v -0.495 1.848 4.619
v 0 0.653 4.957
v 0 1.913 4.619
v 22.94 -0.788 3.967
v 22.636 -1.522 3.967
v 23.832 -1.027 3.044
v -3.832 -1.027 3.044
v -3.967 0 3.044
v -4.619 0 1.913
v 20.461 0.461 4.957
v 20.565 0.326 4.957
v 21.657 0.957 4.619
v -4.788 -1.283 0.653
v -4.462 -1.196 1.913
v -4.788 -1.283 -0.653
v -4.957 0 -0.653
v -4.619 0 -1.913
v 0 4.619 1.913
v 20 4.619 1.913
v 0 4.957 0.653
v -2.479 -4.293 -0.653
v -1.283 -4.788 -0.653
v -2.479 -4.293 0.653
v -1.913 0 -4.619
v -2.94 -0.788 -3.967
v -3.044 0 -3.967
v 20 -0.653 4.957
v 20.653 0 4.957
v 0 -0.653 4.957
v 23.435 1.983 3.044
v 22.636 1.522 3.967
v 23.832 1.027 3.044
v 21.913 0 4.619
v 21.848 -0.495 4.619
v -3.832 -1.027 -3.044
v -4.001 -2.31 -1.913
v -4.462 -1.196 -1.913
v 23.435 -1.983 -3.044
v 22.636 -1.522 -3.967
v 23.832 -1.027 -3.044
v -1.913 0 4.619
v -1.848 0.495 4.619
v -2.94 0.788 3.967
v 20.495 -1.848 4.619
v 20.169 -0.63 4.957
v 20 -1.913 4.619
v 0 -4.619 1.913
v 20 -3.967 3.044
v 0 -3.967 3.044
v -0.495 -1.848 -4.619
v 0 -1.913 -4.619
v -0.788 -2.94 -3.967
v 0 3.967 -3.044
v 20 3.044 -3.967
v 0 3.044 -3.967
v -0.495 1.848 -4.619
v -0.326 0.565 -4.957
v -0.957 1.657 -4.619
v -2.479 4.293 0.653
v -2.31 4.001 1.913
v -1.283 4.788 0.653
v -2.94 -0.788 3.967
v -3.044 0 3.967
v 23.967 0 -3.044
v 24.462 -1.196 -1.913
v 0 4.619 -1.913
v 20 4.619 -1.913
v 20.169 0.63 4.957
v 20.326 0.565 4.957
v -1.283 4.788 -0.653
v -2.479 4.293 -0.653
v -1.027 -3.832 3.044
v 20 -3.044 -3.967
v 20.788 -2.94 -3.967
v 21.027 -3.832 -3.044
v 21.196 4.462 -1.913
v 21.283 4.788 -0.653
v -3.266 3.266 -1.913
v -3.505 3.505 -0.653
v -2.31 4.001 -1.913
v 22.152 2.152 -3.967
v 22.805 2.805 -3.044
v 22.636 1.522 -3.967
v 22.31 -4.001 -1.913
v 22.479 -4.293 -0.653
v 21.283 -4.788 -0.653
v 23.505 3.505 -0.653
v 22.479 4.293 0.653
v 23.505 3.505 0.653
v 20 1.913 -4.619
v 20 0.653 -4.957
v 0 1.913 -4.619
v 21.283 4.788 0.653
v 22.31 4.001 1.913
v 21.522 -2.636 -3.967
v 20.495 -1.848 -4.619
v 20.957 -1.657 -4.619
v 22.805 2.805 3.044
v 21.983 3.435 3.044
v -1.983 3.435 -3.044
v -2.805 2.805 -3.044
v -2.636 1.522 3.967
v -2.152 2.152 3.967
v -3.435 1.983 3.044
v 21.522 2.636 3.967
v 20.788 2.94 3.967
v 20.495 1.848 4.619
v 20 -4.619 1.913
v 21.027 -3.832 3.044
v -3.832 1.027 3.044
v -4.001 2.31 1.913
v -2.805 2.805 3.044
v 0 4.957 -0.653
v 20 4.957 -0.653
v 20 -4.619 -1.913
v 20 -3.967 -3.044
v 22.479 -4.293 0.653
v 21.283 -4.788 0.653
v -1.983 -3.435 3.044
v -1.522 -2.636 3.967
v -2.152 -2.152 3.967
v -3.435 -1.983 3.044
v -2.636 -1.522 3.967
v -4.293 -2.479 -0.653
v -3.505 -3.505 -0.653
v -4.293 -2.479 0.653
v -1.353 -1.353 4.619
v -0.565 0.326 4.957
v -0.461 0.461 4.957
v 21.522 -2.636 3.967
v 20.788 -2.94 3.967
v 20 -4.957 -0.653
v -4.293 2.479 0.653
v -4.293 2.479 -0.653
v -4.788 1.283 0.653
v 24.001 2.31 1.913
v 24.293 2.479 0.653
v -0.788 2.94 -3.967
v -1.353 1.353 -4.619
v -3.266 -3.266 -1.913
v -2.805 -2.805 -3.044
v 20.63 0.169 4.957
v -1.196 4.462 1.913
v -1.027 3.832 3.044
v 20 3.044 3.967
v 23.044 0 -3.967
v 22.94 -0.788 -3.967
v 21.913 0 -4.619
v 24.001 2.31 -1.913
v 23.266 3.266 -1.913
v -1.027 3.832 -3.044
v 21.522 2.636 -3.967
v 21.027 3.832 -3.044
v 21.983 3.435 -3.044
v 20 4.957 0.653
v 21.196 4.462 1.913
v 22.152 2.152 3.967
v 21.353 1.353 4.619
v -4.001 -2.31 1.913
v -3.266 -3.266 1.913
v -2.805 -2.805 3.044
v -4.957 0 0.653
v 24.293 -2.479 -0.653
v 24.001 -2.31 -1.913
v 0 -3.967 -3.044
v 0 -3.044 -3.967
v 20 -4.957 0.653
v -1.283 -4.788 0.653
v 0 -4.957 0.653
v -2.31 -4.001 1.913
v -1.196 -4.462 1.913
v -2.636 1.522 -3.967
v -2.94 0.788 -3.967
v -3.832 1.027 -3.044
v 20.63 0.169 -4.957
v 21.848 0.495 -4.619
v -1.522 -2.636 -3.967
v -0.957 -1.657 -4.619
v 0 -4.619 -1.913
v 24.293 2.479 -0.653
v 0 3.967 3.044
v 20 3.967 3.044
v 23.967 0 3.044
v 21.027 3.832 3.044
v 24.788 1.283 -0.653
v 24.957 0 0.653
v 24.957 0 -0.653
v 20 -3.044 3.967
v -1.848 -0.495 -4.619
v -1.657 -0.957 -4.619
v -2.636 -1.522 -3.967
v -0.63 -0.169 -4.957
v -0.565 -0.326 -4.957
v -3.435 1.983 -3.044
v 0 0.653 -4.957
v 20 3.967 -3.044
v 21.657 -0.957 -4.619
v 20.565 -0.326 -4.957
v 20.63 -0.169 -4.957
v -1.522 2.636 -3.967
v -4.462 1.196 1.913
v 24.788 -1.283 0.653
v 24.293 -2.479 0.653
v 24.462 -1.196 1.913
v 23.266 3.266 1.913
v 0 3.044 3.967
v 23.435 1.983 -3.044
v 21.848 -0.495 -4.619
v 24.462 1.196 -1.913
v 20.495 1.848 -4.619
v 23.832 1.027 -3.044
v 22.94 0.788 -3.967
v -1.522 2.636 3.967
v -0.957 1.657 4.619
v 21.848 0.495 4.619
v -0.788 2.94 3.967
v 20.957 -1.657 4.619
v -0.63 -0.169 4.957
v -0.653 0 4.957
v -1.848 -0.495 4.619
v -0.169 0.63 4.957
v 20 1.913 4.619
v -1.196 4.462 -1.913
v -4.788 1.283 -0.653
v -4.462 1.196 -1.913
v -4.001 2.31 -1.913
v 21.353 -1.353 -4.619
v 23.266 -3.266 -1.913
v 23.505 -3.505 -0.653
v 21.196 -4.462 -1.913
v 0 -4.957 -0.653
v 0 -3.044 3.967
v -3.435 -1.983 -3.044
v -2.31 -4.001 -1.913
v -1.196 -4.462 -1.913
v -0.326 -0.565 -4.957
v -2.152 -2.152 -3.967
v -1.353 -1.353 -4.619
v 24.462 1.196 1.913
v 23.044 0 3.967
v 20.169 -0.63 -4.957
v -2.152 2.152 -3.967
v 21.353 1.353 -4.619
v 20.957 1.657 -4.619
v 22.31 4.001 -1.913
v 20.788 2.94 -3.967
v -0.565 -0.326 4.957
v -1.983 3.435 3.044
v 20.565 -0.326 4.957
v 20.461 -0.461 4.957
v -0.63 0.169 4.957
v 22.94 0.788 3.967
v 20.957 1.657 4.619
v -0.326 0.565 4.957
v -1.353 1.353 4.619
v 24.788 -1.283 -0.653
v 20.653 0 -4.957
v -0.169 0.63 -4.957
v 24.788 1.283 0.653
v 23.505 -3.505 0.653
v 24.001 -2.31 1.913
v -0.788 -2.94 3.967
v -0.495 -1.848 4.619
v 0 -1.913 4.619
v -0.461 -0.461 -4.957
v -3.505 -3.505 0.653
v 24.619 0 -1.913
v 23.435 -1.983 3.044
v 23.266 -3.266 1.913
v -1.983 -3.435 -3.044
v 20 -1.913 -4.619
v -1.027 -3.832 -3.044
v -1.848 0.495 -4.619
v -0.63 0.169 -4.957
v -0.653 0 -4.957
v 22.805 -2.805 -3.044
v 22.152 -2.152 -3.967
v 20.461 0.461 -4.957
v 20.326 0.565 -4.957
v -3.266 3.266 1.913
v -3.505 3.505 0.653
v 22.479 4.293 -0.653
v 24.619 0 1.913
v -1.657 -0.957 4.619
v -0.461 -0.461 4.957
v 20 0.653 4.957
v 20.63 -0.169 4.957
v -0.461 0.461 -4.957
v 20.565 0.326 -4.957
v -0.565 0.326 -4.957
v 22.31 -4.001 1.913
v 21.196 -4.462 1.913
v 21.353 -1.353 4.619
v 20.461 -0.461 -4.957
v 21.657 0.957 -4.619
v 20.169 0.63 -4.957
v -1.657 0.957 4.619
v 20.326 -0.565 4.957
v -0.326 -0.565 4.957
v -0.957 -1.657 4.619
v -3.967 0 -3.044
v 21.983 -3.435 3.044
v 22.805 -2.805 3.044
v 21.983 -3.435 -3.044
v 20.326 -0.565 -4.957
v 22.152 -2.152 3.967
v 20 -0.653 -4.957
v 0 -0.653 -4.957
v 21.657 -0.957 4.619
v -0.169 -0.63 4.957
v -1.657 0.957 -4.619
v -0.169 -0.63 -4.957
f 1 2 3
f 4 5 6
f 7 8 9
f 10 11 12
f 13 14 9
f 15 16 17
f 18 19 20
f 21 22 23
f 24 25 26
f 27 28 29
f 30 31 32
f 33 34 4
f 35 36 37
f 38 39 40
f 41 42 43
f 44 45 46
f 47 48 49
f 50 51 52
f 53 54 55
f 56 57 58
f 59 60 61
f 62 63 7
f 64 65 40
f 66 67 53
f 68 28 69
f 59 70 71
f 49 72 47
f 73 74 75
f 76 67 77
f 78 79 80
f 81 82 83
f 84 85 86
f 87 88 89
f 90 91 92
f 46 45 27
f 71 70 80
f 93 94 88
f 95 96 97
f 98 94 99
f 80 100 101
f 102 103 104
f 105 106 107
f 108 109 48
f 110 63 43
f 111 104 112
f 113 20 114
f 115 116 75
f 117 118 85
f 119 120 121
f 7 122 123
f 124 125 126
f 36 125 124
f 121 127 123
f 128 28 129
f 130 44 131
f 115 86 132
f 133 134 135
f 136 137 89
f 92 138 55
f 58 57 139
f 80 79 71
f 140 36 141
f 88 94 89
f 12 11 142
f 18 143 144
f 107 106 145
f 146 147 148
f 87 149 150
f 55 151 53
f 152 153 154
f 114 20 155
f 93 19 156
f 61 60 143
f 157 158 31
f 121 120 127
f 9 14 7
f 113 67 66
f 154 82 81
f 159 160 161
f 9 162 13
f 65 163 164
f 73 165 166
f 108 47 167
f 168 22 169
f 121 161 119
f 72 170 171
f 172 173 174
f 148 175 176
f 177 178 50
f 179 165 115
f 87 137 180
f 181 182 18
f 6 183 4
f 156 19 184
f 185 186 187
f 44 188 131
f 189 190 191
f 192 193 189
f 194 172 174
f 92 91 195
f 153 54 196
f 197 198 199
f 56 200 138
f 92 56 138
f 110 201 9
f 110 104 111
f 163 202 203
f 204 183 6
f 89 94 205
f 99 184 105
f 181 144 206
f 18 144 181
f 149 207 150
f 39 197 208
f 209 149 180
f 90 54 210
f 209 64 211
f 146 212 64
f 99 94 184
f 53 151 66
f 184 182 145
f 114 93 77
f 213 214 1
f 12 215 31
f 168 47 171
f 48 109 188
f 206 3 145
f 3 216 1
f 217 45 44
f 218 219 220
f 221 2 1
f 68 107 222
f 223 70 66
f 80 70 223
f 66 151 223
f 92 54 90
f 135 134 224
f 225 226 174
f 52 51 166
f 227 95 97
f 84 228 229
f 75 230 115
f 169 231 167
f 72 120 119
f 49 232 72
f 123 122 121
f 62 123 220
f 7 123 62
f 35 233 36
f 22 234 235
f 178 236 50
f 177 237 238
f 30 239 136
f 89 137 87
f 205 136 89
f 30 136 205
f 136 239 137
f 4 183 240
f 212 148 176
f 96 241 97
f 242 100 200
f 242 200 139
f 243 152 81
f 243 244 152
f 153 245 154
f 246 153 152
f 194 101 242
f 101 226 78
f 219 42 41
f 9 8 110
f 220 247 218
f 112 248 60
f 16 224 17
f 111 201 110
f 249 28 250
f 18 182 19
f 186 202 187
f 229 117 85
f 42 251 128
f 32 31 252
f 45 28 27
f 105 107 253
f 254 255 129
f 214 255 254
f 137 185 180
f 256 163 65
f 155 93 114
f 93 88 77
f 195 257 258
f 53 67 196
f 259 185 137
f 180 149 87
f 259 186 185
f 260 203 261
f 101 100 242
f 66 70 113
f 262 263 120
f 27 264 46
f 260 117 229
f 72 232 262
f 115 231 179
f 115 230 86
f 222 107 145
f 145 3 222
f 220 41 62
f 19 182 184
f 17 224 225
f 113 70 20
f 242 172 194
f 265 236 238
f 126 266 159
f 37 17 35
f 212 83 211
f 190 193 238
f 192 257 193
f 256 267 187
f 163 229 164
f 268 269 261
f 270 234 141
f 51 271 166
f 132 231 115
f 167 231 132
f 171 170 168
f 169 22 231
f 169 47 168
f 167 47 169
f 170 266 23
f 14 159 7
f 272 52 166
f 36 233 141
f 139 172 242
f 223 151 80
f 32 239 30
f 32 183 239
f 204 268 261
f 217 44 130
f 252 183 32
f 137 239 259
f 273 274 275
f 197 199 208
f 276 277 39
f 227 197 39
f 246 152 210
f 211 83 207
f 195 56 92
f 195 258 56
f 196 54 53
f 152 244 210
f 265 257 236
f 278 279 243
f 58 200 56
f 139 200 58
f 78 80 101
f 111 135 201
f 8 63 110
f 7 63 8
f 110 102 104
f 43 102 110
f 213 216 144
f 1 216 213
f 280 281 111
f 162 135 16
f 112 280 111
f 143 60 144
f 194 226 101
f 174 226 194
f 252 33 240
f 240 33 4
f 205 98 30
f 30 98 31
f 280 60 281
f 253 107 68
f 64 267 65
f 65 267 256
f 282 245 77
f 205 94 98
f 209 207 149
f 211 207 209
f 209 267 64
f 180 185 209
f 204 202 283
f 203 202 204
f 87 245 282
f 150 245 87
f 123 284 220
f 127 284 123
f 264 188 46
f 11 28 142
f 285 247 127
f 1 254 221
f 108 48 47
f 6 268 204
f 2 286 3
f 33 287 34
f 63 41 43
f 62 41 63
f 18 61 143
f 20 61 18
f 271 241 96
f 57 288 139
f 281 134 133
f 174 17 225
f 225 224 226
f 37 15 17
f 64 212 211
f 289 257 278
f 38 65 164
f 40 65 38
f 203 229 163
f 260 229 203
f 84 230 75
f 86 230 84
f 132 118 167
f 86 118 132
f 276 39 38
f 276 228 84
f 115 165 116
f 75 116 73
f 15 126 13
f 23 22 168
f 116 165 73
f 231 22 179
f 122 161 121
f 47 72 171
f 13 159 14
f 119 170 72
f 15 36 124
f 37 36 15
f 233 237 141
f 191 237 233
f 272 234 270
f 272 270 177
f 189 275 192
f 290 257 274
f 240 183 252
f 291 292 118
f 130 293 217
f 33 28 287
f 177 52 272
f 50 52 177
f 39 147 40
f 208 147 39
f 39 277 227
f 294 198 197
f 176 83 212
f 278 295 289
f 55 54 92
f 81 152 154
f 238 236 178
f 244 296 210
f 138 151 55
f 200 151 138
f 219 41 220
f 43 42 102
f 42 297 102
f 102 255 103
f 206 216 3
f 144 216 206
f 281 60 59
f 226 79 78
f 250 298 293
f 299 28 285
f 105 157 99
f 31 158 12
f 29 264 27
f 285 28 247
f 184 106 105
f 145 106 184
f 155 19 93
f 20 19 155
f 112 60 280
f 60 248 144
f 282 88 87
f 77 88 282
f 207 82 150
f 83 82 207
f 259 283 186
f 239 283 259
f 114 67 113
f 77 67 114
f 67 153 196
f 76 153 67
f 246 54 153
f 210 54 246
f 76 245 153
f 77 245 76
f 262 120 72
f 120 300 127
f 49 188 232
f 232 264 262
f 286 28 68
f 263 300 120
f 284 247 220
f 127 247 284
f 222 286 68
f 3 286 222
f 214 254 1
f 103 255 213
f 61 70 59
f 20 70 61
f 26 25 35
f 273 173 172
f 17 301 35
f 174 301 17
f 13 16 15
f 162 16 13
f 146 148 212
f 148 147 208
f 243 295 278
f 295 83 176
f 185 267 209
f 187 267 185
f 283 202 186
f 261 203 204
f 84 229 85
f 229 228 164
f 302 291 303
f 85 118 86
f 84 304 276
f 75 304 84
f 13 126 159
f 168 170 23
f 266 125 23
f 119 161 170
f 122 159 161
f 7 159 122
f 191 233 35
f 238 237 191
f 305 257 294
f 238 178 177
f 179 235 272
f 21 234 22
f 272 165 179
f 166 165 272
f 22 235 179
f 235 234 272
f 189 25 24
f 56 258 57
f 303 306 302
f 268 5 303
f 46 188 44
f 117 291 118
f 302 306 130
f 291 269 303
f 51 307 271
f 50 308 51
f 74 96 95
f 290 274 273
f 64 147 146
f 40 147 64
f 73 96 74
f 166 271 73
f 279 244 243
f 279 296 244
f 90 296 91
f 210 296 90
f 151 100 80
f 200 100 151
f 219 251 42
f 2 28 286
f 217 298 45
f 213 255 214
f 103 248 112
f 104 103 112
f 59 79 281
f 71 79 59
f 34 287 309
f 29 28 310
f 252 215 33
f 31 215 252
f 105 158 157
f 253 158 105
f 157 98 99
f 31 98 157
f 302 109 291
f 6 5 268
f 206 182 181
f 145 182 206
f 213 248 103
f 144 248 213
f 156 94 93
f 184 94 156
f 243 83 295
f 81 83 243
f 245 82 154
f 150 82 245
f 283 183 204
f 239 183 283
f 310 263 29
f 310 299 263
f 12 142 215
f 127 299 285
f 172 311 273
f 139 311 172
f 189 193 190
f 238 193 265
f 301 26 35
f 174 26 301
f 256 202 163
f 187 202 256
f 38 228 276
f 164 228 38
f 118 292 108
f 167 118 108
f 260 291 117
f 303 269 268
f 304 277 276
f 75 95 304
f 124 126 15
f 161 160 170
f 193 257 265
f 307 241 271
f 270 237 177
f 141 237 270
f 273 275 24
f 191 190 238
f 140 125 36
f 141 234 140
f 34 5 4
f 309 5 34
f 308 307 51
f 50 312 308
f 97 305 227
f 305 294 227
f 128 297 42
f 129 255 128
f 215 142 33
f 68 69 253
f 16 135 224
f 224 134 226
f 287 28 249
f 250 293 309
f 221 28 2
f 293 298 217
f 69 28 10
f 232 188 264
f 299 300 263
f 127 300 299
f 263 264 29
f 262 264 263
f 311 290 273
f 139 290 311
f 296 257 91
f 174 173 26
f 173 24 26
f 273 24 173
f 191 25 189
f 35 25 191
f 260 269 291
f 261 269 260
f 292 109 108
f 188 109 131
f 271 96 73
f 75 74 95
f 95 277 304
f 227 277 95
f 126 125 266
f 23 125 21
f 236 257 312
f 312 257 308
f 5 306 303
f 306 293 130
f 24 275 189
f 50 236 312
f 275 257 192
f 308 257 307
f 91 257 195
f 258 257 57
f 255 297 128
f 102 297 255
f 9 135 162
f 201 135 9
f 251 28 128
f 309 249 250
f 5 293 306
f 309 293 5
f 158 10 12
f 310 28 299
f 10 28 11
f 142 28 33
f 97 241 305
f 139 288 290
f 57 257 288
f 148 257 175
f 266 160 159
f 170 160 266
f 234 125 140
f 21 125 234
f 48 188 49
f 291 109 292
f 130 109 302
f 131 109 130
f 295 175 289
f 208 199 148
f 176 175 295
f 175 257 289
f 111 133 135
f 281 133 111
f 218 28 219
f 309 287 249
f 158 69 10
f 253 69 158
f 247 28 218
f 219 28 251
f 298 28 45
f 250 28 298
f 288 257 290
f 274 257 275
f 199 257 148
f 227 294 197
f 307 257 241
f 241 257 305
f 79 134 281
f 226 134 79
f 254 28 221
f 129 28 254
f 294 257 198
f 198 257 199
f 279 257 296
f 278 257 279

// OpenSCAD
hull(){ sphere(5, $fn=24); translate([20,0,0]) sphere(5, $fn=24); }
